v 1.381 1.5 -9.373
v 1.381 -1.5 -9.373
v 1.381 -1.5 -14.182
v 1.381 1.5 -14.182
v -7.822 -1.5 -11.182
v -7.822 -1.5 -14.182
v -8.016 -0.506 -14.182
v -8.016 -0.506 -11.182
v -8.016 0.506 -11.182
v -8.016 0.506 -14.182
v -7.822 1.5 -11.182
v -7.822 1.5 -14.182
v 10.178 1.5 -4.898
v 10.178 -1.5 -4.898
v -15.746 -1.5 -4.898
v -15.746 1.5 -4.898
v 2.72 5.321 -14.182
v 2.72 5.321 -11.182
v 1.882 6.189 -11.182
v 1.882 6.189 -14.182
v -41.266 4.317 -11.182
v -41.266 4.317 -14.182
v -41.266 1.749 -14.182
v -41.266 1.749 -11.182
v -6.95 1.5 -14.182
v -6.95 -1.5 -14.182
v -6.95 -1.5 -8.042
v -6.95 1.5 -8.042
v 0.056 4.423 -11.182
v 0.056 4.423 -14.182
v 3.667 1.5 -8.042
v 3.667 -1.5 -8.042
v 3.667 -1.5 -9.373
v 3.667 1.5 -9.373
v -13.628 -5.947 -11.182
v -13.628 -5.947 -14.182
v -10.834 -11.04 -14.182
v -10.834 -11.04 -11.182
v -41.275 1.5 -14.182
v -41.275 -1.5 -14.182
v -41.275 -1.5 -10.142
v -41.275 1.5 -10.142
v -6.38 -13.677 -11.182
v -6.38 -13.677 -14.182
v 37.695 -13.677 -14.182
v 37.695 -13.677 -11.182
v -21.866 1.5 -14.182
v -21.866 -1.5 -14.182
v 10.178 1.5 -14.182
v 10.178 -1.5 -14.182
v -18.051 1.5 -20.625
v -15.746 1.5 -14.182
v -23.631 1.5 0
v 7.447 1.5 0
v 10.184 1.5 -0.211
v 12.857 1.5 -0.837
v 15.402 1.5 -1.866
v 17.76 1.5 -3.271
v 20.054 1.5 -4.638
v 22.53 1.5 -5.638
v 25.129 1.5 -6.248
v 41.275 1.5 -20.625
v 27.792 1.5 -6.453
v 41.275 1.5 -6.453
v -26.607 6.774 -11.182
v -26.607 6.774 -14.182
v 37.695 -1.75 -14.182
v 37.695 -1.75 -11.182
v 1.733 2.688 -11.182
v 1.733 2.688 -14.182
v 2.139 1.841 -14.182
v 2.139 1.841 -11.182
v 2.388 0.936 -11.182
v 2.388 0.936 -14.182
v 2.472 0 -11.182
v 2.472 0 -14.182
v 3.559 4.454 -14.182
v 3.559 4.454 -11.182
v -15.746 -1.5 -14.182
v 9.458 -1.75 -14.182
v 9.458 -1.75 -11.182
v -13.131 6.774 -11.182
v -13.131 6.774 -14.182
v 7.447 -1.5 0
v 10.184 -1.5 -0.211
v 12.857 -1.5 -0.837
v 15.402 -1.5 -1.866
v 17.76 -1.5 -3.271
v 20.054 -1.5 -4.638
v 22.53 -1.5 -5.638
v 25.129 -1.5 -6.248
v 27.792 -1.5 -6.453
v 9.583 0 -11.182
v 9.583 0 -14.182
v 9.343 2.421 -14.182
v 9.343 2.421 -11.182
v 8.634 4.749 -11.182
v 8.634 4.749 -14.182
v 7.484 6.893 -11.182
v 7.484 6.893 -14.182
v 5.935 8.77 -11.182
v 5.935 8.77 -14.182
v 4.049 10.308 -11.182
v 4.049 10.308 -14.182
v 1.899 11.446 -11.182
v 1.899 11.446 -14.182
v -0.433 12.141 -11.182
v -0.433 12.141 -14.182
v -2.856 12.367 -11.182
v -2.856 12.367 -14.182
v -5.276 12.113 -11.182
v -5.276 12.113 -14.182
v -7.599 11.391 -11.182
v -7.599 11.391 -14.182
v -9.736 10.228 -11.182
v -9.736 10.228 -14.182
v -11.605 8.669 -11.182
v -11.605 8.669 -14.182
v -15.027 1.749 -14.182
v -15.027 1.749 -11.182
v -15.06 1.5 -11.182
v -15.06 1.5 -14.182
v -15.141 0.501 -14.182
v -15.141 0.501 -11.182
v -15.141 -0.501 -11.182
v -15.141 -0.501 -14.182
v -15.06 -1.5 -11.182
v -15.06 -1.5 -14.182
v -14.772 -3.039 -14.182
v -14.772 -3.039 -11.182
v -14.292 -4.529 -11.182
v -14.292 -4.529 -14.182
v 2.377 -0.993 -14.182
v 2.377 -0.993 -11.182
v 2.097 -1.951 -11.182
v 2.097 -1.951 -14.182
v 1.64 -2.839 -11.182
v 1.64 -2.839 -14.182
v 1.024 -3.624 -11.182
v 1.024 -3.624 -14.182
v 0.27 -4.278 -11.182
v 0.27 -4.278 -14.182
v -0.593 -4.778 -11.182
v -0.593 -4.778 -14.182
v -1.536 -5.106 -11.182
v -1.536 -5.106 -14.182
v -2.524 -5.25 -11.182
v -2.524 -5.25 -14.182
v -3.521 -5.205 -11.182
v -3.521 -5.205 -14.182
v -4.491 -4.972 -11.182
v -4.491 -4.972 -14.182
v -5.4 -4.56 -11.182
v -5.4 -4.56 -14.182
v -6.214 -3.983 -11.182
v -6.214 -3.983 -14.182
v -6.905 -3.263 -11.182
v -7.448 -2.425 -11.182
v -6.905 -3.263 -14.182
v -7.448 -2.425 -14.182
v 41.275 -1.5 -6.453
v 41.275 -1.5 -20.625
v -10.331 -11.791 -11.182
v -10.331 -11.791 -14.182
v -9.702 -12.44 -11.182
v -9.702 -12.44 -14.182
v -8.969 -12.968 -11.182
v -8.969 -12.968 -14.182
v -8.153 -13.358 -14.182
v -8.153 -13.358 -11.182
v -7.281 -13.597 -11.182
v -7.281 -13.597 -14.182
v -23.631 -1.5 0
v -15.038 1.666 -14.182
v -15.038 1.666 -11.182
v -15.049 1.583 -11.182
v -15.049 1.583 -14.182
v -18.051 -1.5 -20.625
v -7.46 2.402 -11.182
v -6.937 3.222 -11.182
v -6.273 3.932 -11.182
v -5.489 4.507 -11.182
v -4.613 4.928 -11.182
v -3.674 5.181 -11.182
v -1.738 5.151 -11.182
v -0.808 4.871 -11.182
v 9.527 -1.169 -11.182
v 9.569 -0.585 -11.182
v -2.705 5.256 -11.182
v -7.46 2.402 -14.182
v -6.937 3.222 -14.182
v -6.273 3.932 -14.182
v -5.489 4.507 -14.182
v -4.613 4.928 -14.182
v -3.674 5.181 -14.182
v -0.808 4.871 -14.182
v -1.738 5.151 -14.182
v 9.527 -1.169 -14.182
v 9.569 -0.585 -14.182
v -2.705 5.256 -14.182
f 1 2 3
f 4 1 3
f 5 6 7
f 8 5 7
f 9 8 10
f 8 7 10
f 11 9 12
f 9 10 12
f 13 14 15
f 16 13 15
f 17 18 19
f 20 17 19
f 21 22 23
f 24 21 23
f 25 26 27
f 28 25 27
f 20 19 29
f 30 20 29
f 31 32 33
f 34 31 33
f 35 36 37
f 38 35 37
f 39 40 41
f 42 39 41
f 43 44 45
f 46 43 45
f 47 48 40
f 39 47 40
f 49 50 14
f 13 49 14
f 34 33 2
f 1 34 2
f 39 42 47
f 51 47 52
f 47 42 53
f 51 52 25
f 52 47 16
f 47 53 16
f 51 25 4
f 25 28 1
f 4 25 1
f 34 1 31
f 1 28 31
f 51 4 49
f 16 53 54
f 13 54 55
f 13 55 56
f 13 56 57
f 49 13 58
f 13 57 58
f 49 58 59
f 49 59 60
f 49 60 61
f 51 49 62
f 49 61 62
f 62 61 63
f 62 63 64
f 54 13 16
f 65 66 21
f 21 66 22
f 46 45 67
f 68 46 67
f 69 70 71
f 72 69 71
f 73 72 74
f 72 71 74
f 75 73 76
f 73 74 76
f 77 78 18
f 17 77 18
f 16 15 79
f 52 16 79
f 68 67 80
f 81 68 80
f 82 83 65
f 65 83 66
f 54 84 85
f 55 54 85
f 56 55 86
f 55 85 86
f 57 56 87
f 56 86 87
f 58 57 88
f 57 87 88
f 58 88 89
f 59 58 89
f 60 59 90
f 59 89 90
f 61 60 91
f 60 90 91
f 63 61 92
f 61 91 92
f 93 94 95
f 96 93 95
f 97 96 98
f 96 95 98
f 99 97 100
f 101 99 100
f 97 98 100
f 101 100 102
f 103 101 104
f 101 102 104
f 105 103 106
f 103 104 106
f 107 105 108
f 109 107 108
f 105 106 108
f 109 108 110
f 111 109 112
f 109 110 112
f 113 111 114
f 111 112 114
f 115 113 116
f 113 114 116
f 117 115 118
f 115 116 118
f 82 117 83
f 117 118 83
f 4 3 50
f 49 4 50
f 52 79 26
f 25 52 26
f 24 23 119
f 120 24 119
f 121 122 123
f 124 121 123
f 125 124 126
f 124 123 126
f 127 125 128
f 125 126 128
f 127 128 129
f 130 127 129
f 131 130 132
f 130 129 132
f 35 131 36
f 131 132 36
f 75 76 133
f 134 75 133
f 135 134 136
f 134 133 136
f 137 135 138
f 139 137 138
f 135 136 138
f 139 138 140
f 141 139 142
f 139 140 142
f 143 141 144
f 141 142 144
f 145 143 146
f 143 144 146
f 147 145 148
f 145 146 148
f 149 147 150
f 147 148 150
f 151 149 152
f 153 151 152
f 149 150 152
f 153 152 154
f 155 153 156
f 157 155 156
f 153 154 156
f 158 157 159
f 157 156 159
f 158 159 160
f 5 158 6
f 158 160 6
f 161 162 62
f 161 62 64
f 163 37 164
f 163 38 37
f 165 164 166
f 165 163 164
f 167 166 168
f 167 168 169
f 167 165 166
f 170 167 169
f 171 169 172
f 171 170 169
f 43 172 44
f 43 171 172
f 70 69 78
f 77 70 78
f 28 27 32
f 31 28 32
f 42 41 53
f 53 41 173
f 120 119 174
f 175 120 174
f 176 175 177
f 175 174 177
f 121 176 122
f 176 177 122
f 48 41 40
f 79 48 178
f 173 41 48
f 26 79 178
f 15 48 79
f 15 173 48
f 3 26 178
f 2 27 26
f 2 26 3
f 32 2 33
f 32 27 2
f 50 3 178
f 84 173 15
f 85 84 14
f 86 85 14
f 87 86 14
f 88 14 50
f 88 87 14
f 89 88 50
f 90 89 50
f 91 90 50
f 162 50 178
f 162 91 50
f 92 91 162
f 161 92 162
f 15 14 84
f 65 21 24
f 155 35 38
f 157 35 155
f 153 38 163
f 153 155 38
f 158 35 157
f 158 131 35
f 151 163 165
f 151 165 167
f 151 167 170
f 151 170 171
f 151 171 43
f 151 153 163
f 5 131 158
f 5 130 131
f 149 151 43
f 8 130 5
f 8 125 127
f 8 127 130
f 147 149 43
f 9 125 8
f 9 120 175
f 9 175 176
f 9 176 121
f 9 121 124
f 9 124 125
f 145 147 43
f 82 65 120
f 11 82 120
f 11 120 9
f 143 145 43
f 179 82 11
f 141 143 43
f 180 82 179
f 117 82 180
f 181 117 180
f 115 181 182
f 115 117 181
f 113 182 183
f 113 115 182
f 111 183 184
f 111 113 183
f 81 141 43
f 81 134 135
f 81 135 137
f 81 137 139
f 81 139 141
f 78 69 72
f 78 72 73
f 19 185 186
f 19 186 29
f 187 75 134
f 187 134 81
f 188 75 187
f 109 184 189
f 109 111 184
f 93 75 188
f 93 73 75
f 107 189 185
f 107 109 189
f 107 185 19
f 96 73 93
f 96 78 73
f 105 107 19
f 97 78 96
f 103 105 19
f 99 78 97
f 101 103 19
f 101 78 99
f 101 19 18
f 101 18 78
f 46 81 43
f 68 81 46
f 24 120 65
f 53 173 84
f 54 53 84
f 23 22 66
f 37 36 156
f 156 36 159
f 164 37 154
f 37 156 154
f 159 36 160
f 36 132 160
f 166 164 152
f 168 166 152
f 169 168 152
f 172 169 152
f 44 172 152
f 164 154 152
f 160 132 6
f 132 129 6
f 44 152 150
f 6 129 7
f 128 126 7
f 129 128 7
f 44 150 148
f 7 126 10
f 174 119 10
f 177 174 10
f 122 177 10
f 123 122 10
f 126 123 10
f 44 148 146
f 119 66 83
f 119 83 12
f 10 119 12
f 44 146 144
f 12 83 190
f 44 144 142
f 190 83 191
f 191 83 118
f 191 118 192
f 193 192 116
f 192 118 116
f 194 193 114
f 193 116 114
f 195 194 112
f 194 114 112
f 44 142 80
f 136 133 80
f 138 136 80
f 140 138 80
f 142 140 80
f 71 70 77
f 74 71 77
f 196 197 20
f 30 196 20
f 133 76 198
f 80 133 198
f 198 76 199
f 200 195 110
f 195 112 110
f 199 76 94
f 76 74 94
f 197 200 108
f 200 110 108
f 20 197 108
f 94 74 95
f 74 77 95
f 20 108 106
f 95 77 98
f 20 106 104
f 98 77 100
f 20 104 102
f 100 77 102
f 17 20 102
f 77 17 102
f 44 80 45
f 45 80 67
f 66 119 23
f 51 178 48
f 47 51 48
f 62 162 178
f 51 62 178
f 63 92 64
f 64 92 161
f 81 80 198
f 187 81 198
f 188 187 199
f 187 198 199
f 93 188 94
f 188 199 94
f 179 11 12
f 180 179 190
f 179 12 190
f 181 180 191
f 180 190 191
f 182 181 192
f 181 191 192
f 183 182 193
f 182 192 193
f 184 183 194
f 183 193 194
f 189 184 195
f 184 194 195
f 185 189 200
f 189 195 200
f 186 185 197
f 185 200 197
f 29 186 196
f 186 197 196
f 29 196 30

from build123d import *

# Parameters (mm, degrees)
F0_W     = 82.55
F0_H     = 57.15
F1_DEPTH = 1.5
F3_DEPTH = 25.4
F5_DEPTH = 3
F6_R     = 5.08
F8_DEPTH = 25.4


with BuildPart() as f1:
    # F0 (on Front) → F1 (new body, symmetric)
    with BuildSketch(Plane.XZ):
        Rectangle(F0_W, F0_H)
    extrude(amount=F1_DEPTH, both=True)

    # F2 (on face) → F3 (cut)
    with BuildSketch(Plane.XZ.offset(1.5)):
        with BuildLine():
            Line((41.275, 28.575), (-41.275, 28.575))
            Line((-41.275, 28.575), (-41.275, 0))
            Line((-41.275, 0), (-23.6307755113, 0))
            Line((-23.6307755113, 0), (7.4471277827, 0))
            ThreePointArc((7.4471277827, 0), (12.856772021, -0.8373450289), (17.7601050455, -3.2710094949))
            ThreePointArc((17.7601050455, -3.2710094949), (22.5296158975, -5.6382541879), (27.7916196756, -6.4527463267))
            Line((27.7916196756, -6.4527463267), (41.275, -6.4527463267))
            Line((41.275, -6.4527463267), (41.275, 28.575))
        make_face()
        Polygon((-21.8661062664, -14.1818345485), (-41.275, -14.1818345485), (-41.275, -28.575), (41.275, -28.575), (41.275, -20.6253529236), (-18.0511887433, -20.6253529236), align=None)
        Polygon((-2.7842603665, -4.8976809679), (-15.74646855, -4.8976809679), (-15.74646855, -10.6753705962), (-15.74646855, -14.1818345485), (-6.9498603665, -14.1818345485), (-6.9498603665, -9.3729560225), (-6.9498603665, -8.042470455), (-2.7842603665, -8.042470455), align=None)
        Polygon((-23.6307755113, 0), (-41.275, 0), (-41.275, -10.1419957355), align=None)
        Polygon((10.1779478169, -4.8976809679), (-2.7842603665, -4.8976809679), (-2.7842603665, -8.042470455), (3.6673396335, -8.042470455), (3.6673396335, -9.3729560225), (1.3813396335, -9.3729560225), (1.3813396335, -14.1818345485), (10.1779478169, -14.1818345485), align=None)
    extrude(amount=-F3_DEPTH, mode=Mode.SUBTRACT)


with BuildPart() as f5:
    # F4 (on face) → F5 (new body)
    with BuildSketch(Plane.XY.offset(-14.1818345485)):
        with BuildLine():
            Line((-41.2661683759, 1.7493753928), (-15.0268845477, 1.7493753928))
            ThreePointArc((-15.0268845477, 1.7493753928), (-14.3550164783, 4.3657489743), (-13.1311116511, 6.7738341875))
            Line((-13.1311116511, 6.7738341875), (-26.6073276859, 6.7738341875))
            Line((-26.6073276859, 6.7738341875), (-41.2661683759, 4.3170175823))
            Line((-41.2661683759, 4.3170175823), (-41.2661683759, 1.7493753928))
        make_face()
        with BuildLine():
            ThreePointArc((9.4582745469, -1.75), (-0.5723679095, -12.1675672533), (-13.6276444456, -5.9466951174))
            Line((-13.6276444456, -5.9466951174), (-9.3881528649, -13.6771125344))
            Line((-9.3881528649, -13.6771125344), (37.6951355663, -13.6771125344))
            Line((37.6951355663, -13.6771125344), (37.6951355663, -1.75))
            Line((37.6951355663, -1.75), (9.4582745469, -1.75))
        make_face()
        with BuildLine():
            ThreePointArc((-15.0268845477, 1.7493753928), (-15.0440433144, 1.6247717304), (-15.0599339165, 1.5))
            Line((-15.0599339165, 1.5), (-7.8221495184, 1.5))
            ThreePointArc((-7.8221495184, 1.5), (-2.0263402916, 5.2015271091), (2.4721953887, 0))
            ThreePointArc((2.4721953887, 0), (-2.0263402916, -5.2015271091), (-7.8221495184, -1.5))
            Line((-7.8221495184, -1.5), (-15.0599339165, -1.5))
            ThreePointArc((-15.0599339165, -1.5), (-14.5556655834, -3.7915933755), (-13.6276444456, -5.9466951174))
            ThreePointArc((-13.6276444456, -5.9466951174), (-0.5723679095, -12.1675672533), (9.4582745469, -1.75))
            ThreePointArc((9.4582745469, -1.75), (9.5515681239, -0.877209531), (9.5827182906, 0))
            ThreePointArc((9.5827182906, 0), (0.7500622065, 11.8511908708), (-13.1311116511, 6.7738341875))
            ThreePointArc((-13.1311116511, 6.7738341875), (-14.3550164783, 4.3657489743), (-15.0268845477, 1.7493753928))
        make_face()
        with BuildLine():
            Line((-7.8221495184, 1.5), (-15.0599339165, 1.5))
            ThreePointArc((-15.0599339165, 1.5), (-15.1512390236, 0), (-15.0599339165, -1.5))
            Line((-15.0599339165, -1.5), (-7.8221495184, -1.5))
            ThreePointArc((-7.8221495184, -1.5), (-8.0407161217, 0), (-7.8221495184, 1.5))
        make_face()
    extrude(amount=F5_DEPTH)

    # F6
    f6_edges = [f5.edges().sort_by_distance(p)[0] for p in [
        (-9.388153, -13.677113, -12.681835),
    ]]
    fillet(f6_edges, radius=F6_R)

    # F7 (on face) → F8 (cut)
    with BuildSketch(Plane.XY.offset(-11.1818345485)):
        with BuildLine():
            ThreePointArc((0.9950713413, 3.6533517418), (1.3918603451, 3.1922316502), (1.7327154988, 2.688355657))
            Line((1.7327154988, 2.688355657), (3.5589465154, 4.4537112229))
            Line((3.5589465154, 4.4537112229), (2.7204026217, 5.3211709558))
            Line((2.7204026217, 5.3211709558), (0.9950713413, 3.6533517418))
        make_face()
        with BuildLine():
            Line((1.8818587279, 6.1886306887), (0.0556277112, 4.4232751228))
            ThreePointArc((0.0556277112, 4.4232751228), (0.5476629738, 4.0655398118), (0.9950713413, 3.6533517418))
            Line((0.9950713413, 3.6533517418), (2.7204026217, 5.3211709558))
            Line((2.7204026217, 5.3211709558), (1.8818587279, 6.1886306887))
        make_face()
    extrude(amount=-F8_DEPTH, mode=Mode.SUBTRACT)


solid = Compound([f1.part, f5.part])
